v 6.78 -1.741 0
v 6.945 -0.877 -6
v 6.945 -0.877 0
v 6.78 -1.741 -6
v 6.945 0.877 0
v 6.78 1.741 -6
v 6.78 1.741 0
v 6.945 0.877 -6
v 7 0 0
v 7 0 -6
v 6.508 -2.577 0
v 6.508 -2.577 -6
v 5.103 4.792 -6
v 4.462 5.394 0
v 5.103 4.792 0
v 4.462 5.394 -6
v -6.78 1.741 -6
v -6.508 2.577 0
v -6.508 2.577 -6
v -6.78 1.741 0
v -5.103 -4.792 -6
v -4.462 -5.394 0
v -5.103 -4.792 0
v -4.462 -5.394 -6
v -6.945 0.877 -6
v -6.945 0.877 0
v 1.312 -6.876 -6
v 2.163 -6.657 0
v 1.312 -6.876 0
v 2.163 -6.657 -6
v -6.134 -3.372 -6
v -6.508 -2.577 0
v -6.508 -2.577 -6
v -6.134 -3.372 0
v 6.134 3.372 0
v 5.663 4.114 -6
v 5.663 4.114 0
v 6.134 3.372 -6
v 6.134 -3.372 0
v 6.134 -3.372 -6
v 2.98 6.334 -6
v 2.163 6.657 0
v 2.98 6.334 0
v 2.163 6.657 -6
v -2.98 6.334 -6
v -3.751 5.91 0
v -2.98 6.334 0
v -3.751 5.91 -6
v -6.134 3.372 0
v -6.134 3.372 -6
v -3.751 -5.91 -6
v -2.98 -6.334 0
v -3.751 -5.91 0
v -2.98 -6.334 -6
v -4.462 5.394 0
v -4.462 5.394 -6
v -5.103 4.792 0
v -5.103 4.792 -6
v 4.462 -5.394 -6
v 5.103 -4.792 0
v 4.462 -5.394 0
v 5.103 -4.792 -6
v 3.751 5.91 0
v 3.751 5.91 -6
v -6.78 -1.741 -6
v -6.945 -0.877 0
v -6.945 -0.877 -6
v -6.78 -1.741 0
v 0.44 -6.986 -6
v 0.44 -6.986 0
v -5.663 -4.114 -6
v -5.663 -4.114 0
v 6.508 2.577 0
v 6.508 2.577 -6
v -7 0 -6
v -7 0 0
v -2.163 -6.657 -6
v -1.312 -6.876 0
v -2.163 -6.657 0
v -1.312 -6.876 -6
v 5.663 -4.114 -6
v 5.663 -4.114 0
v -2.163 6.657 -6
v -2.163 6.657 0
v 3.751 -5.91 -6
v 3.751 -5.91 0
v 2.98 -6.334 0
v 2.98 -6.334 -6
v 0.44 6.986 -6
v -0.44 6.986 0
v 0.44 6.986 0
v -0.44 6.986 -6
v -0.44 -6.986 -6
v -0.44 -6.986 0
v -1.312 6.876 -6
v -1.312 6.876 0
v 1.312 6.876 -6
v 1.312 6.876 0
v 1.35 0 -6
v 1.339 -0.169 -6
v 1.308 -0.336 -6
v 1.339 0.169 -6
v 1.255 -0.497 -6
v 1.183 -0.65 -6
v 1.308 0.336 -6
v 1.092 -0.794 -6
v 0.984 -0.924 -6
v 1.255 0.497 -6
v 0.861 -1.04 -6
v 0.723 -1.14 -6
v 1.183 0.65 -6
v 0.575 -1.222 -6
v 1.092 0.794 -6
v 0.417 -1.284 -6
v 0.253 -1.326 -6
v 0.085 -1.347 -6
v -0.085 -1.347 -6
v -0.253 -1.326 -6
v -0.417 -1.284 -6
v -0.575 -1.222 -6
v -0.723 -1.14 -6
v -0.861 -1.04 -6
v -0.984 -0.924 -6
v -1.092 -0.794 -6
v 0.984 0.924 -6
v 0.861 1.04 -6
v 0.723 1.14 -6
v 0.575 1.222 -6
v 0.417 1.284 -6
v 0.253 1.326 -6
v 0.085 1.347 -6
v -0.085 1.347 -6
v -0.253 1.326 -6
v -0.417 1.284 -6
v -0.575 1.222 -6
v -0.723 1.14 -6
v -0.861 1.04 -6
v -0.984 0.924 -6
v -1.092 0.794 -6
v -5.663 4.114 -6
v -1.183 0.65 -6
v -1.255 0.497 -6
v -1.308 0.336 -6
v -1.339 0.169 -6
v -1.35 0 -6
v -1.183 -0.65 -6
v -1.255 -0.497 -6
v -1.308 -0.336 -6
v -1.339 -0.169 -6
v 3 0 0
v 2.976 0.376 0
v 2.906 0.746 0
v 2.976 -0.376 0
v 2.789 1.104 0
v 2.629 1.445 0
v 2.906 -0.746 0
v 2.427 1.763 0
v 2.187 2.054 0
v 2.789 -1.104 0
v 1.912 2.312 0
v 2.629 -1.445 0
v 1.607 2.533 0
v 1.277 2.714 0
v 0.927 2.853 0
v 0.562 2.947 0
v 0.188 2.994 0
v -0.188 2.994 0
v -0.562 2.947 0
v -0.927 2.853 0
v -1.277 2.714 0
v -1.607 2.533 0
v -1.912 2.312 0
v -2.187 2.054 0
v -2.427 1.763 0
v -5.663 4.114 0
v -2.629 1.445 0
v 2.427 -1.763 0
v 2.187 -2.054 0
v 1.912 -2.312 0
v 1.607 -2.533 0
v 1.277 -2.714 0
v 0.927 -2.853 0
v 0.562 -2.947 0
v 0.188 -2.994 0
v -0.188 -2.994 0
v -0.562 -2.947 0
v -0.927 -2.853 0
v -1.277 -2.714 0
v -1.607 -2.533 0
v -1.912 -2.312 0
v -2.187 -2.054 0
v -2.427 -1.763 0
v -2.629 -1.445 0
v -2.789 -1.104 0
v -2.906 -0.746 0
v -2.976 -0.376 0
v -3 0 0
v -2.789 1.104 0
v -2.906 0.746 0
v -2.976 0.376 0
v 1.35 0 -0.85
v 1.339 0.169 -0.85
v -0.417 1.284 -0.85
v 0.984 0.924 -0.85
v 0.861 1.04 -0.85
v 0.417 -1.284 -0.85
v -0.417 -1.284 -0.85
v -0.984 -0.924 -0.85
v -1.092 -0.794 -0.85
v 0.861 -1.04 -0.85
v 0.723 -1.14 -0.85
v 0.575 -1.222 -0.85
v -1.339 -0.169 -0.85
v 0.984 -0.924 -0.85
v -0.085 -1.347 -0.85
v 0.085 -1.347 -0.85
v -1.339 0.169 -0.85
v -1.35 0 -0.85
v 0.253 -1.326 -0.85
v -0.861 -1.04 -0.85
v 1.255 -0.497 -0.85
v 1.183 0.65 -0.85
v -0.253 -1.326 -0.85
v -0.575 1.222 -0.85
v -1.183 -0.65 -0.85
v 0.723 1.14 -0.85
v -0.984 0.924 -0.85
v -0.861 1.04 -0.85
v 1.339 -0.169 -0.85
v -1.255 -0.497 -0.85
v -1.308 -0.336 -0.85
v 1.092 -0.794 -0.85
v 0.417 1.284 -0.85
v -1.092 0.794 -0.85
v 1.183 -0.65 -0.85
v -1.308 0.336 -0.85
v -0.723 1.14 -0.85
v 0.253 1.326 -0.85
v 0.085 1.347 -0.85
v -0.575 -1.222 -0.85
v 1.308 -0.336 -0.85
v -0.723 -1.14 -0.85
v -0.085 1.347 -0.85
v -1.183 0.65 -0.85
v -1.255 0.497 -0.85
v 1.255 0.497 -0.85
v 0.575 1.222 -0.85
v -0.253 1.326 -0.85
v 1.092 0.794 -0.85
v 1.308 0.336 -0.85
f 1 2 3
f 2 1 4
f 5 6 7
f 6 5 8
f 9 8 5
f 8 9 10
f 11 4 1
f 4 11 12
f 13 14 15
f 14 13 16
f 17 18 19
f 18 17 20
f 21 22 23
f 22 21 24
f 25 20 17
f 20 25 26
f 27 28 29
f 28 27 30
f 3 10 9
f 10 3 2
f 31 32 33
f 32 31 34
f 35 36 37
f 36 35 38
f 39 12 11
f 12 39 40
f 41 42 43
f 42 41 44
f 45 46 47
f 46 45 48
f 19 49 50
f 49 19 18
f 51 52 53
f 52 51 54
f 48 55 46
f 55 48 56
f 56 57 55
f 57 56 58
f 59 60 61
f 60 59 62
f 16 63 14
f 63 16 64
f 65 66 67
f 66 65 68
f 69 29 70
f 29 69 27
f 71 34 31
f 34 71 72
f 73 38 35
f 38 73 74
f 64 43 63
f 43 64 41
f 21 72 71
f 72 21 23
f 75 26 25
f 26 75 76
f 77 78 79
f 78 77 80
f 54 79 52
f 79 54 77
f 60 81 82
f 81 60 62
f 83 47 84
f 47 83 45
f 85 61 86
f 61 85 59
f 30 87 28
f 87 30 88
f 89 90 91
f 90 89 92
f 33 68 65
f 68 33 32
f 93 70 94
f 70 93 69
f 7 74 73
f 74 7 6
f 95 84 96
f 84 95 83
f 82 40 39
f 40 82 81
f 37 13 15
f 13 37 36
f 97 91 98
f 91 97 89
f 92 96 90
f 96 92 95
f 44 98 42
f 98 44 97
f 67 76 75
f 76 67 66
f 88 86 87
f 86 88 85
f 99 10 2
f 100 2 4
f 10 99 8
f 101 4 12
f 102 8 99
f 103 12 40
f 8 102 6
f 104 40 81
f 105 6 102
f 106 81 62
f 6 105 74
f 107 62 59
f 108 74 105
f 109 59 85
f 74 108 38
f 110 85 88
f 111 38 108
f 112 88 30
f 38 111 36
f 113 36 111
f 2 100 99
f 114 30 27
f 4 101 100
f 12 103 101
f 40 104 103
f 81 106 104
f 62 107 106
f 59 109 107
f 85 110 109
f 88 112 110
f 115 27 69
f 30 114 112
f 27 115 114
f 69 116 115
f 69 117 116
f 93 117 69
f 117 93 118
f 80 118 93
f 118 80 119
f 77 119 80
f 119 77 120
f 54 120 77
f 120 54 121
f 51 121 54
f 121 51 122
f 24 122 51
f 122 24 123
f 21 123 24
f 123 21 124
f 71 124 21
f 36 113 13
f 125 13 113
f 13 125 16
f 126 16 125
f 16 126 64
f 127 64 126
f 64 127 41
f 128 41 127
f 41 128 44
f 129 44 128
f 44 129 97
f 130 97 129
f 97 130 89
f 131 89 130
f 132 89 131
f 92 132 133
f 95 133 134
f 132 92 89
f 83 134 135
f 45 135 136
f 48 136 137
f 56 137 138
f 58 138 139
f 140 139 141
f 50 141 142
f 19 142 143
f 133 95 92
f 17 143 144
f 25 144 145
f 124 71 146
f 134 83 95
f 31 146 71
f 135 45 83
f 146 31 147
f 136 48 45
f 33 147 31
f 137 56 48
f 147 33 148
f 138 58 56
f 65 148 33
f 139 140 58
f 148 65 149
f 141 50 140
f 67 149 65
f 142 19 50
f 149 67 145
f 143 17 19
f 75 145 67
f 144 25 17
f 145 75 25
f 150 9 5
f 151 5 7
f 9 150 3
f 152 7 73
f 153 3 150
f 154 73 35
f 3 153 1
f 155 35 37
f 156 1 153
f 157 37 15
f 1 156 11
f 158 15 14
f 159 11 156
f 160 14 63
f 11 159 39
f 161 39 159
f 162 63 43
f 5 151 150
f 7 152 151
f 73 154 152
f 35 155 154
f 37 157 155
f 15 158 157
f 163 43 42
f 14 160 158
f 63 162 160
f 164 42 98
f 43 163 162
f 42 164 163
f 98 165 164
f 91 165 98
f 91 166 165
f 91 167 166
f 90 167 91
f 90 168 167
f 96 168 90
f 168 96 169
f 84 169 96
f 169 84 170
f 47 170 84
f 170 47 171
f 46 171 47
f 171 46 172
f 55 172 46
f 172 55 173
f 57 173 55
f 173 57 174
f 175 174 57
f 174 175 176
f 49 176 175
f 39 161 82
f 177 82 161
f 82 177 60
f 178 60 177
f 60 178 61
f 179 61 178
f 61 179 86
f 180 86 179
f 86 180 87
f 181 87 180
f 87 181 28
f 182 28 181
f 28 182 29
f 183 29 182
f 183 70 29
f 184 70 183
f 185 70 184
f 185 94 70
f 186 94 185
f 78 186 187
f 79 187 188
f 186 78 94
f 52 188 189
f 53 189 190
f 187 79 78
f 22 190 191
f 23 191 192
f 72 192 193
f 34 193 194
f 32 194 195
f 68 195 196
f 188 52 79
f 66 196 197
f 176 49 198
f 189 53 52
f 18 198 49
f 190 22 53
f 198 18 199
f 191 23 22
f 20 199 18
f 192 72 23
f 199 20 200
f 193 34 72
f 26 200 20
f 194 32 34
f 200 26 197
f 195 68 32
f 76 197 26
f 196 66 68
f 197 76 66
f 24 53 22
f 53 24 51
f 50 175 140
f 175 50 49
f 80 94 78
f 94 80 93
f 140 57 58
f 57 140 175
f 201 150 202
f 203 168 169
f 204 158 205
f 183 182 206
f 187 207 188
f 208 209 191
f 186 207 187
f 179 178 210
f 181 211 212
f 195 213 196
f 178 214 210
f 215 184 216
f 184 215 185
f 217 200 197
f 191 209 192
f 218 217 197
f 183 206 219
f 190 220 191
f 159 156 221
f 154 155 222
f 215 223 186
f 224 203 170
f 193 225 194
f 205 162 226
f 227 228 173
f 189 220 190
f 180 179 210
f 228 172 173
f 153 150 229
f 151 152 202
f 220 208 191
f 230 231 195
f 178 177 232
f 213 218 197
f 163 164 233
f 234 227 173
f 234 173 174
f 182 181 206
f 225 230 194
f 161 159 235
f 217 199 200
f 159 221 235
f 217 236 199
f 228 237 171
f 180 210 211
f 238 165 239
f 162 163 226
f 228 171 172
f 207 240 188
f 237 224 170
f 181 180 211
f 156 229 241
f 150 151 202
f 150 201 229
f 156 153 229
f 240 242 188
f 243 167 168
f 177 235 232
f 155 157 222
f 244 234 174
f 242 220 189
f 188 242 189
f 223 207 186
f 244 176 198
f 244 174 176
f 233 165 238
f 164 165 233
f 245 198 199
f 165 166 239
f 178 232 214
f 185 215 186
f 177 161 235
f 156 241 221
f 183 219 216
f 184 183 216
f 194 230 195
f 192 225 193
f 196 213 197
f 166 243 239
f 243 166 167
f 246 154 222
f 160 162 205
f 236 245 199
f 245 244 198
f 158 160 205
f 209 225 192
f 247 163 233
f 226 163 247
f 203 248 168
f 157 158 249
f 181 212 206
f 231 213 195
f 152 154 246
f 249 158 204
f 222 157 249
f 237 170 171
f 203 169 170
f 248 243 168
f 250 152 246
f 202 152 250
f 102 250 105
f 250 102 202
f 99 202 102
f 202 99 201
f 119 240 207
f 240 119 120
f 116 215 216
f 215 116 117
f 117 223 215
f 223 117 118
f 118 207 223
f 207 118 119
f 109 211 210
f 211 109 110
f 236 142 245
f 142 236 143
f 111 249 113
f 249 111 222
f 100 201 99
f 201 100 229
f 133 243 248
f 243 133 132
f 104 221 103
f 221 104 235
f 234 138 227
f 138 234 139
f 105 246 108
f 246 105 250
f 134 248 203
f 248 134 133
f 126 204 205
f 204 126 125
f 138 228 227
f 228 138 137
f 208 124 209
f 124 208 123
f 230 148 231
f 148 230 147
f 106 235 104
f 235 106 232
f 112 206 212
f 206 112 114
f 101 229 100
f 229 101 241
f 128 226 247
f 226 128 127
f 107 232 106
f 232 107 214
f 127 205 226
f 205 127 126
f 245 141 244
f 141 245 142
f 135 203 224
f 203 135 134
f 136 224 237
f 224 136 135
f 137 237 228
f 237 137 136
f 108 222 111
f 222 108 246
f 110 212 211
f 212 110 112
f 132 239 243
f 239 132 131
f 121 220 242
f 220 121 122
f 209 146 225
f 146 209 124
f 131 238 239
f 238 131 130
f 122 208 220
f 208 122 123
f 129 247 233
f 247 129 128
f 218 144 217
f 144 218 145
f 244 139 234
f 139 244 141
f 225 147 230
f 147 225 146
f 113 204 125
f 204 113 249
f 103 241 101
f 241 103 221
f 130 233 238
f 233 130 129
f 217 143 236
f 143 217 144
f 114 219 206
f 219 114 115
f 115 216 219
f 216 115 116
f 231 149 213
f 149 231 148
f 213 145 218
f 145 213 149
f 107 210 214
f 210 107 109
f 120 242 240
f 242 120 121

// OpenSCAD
$fn = 50;


difference() {
	union() {
		translate(v = [0, 0, -6.0000000000]) {
			cylinder(h = 6, r = 7.0000000000);
		}
		translate(v = [0, 0, -6.0000000000]) {
			cylinder(h = 6, r = 2.8750000000);
		}
	}
	union() {
		translate(v = [0, 0, 0]) {
			rotate(a = [0, 0, 0]) {
				difference() {
					union() {
						translate(v = [0, 0, -6.0000000000]) {
							cylinder(h = 6, r = 1.0000000000);
						}
						translate(v = [0, 0, -0.8500000000]) {
							cylinder(h = 0.8500000000, r1 = 1.3500000000, r2 = 3.0000000000);
						}
						translate(v = [0, 0, -6.0000000000]) {
							cylinder(h = 6, r = 1.3500000000);
						}
						translate(v = [0, 0, -6.0000000000]) {
							cylinder(h = 6, r = 1.0000000000);
						}
					}
					union();
				}
			}
		}
	}
}
